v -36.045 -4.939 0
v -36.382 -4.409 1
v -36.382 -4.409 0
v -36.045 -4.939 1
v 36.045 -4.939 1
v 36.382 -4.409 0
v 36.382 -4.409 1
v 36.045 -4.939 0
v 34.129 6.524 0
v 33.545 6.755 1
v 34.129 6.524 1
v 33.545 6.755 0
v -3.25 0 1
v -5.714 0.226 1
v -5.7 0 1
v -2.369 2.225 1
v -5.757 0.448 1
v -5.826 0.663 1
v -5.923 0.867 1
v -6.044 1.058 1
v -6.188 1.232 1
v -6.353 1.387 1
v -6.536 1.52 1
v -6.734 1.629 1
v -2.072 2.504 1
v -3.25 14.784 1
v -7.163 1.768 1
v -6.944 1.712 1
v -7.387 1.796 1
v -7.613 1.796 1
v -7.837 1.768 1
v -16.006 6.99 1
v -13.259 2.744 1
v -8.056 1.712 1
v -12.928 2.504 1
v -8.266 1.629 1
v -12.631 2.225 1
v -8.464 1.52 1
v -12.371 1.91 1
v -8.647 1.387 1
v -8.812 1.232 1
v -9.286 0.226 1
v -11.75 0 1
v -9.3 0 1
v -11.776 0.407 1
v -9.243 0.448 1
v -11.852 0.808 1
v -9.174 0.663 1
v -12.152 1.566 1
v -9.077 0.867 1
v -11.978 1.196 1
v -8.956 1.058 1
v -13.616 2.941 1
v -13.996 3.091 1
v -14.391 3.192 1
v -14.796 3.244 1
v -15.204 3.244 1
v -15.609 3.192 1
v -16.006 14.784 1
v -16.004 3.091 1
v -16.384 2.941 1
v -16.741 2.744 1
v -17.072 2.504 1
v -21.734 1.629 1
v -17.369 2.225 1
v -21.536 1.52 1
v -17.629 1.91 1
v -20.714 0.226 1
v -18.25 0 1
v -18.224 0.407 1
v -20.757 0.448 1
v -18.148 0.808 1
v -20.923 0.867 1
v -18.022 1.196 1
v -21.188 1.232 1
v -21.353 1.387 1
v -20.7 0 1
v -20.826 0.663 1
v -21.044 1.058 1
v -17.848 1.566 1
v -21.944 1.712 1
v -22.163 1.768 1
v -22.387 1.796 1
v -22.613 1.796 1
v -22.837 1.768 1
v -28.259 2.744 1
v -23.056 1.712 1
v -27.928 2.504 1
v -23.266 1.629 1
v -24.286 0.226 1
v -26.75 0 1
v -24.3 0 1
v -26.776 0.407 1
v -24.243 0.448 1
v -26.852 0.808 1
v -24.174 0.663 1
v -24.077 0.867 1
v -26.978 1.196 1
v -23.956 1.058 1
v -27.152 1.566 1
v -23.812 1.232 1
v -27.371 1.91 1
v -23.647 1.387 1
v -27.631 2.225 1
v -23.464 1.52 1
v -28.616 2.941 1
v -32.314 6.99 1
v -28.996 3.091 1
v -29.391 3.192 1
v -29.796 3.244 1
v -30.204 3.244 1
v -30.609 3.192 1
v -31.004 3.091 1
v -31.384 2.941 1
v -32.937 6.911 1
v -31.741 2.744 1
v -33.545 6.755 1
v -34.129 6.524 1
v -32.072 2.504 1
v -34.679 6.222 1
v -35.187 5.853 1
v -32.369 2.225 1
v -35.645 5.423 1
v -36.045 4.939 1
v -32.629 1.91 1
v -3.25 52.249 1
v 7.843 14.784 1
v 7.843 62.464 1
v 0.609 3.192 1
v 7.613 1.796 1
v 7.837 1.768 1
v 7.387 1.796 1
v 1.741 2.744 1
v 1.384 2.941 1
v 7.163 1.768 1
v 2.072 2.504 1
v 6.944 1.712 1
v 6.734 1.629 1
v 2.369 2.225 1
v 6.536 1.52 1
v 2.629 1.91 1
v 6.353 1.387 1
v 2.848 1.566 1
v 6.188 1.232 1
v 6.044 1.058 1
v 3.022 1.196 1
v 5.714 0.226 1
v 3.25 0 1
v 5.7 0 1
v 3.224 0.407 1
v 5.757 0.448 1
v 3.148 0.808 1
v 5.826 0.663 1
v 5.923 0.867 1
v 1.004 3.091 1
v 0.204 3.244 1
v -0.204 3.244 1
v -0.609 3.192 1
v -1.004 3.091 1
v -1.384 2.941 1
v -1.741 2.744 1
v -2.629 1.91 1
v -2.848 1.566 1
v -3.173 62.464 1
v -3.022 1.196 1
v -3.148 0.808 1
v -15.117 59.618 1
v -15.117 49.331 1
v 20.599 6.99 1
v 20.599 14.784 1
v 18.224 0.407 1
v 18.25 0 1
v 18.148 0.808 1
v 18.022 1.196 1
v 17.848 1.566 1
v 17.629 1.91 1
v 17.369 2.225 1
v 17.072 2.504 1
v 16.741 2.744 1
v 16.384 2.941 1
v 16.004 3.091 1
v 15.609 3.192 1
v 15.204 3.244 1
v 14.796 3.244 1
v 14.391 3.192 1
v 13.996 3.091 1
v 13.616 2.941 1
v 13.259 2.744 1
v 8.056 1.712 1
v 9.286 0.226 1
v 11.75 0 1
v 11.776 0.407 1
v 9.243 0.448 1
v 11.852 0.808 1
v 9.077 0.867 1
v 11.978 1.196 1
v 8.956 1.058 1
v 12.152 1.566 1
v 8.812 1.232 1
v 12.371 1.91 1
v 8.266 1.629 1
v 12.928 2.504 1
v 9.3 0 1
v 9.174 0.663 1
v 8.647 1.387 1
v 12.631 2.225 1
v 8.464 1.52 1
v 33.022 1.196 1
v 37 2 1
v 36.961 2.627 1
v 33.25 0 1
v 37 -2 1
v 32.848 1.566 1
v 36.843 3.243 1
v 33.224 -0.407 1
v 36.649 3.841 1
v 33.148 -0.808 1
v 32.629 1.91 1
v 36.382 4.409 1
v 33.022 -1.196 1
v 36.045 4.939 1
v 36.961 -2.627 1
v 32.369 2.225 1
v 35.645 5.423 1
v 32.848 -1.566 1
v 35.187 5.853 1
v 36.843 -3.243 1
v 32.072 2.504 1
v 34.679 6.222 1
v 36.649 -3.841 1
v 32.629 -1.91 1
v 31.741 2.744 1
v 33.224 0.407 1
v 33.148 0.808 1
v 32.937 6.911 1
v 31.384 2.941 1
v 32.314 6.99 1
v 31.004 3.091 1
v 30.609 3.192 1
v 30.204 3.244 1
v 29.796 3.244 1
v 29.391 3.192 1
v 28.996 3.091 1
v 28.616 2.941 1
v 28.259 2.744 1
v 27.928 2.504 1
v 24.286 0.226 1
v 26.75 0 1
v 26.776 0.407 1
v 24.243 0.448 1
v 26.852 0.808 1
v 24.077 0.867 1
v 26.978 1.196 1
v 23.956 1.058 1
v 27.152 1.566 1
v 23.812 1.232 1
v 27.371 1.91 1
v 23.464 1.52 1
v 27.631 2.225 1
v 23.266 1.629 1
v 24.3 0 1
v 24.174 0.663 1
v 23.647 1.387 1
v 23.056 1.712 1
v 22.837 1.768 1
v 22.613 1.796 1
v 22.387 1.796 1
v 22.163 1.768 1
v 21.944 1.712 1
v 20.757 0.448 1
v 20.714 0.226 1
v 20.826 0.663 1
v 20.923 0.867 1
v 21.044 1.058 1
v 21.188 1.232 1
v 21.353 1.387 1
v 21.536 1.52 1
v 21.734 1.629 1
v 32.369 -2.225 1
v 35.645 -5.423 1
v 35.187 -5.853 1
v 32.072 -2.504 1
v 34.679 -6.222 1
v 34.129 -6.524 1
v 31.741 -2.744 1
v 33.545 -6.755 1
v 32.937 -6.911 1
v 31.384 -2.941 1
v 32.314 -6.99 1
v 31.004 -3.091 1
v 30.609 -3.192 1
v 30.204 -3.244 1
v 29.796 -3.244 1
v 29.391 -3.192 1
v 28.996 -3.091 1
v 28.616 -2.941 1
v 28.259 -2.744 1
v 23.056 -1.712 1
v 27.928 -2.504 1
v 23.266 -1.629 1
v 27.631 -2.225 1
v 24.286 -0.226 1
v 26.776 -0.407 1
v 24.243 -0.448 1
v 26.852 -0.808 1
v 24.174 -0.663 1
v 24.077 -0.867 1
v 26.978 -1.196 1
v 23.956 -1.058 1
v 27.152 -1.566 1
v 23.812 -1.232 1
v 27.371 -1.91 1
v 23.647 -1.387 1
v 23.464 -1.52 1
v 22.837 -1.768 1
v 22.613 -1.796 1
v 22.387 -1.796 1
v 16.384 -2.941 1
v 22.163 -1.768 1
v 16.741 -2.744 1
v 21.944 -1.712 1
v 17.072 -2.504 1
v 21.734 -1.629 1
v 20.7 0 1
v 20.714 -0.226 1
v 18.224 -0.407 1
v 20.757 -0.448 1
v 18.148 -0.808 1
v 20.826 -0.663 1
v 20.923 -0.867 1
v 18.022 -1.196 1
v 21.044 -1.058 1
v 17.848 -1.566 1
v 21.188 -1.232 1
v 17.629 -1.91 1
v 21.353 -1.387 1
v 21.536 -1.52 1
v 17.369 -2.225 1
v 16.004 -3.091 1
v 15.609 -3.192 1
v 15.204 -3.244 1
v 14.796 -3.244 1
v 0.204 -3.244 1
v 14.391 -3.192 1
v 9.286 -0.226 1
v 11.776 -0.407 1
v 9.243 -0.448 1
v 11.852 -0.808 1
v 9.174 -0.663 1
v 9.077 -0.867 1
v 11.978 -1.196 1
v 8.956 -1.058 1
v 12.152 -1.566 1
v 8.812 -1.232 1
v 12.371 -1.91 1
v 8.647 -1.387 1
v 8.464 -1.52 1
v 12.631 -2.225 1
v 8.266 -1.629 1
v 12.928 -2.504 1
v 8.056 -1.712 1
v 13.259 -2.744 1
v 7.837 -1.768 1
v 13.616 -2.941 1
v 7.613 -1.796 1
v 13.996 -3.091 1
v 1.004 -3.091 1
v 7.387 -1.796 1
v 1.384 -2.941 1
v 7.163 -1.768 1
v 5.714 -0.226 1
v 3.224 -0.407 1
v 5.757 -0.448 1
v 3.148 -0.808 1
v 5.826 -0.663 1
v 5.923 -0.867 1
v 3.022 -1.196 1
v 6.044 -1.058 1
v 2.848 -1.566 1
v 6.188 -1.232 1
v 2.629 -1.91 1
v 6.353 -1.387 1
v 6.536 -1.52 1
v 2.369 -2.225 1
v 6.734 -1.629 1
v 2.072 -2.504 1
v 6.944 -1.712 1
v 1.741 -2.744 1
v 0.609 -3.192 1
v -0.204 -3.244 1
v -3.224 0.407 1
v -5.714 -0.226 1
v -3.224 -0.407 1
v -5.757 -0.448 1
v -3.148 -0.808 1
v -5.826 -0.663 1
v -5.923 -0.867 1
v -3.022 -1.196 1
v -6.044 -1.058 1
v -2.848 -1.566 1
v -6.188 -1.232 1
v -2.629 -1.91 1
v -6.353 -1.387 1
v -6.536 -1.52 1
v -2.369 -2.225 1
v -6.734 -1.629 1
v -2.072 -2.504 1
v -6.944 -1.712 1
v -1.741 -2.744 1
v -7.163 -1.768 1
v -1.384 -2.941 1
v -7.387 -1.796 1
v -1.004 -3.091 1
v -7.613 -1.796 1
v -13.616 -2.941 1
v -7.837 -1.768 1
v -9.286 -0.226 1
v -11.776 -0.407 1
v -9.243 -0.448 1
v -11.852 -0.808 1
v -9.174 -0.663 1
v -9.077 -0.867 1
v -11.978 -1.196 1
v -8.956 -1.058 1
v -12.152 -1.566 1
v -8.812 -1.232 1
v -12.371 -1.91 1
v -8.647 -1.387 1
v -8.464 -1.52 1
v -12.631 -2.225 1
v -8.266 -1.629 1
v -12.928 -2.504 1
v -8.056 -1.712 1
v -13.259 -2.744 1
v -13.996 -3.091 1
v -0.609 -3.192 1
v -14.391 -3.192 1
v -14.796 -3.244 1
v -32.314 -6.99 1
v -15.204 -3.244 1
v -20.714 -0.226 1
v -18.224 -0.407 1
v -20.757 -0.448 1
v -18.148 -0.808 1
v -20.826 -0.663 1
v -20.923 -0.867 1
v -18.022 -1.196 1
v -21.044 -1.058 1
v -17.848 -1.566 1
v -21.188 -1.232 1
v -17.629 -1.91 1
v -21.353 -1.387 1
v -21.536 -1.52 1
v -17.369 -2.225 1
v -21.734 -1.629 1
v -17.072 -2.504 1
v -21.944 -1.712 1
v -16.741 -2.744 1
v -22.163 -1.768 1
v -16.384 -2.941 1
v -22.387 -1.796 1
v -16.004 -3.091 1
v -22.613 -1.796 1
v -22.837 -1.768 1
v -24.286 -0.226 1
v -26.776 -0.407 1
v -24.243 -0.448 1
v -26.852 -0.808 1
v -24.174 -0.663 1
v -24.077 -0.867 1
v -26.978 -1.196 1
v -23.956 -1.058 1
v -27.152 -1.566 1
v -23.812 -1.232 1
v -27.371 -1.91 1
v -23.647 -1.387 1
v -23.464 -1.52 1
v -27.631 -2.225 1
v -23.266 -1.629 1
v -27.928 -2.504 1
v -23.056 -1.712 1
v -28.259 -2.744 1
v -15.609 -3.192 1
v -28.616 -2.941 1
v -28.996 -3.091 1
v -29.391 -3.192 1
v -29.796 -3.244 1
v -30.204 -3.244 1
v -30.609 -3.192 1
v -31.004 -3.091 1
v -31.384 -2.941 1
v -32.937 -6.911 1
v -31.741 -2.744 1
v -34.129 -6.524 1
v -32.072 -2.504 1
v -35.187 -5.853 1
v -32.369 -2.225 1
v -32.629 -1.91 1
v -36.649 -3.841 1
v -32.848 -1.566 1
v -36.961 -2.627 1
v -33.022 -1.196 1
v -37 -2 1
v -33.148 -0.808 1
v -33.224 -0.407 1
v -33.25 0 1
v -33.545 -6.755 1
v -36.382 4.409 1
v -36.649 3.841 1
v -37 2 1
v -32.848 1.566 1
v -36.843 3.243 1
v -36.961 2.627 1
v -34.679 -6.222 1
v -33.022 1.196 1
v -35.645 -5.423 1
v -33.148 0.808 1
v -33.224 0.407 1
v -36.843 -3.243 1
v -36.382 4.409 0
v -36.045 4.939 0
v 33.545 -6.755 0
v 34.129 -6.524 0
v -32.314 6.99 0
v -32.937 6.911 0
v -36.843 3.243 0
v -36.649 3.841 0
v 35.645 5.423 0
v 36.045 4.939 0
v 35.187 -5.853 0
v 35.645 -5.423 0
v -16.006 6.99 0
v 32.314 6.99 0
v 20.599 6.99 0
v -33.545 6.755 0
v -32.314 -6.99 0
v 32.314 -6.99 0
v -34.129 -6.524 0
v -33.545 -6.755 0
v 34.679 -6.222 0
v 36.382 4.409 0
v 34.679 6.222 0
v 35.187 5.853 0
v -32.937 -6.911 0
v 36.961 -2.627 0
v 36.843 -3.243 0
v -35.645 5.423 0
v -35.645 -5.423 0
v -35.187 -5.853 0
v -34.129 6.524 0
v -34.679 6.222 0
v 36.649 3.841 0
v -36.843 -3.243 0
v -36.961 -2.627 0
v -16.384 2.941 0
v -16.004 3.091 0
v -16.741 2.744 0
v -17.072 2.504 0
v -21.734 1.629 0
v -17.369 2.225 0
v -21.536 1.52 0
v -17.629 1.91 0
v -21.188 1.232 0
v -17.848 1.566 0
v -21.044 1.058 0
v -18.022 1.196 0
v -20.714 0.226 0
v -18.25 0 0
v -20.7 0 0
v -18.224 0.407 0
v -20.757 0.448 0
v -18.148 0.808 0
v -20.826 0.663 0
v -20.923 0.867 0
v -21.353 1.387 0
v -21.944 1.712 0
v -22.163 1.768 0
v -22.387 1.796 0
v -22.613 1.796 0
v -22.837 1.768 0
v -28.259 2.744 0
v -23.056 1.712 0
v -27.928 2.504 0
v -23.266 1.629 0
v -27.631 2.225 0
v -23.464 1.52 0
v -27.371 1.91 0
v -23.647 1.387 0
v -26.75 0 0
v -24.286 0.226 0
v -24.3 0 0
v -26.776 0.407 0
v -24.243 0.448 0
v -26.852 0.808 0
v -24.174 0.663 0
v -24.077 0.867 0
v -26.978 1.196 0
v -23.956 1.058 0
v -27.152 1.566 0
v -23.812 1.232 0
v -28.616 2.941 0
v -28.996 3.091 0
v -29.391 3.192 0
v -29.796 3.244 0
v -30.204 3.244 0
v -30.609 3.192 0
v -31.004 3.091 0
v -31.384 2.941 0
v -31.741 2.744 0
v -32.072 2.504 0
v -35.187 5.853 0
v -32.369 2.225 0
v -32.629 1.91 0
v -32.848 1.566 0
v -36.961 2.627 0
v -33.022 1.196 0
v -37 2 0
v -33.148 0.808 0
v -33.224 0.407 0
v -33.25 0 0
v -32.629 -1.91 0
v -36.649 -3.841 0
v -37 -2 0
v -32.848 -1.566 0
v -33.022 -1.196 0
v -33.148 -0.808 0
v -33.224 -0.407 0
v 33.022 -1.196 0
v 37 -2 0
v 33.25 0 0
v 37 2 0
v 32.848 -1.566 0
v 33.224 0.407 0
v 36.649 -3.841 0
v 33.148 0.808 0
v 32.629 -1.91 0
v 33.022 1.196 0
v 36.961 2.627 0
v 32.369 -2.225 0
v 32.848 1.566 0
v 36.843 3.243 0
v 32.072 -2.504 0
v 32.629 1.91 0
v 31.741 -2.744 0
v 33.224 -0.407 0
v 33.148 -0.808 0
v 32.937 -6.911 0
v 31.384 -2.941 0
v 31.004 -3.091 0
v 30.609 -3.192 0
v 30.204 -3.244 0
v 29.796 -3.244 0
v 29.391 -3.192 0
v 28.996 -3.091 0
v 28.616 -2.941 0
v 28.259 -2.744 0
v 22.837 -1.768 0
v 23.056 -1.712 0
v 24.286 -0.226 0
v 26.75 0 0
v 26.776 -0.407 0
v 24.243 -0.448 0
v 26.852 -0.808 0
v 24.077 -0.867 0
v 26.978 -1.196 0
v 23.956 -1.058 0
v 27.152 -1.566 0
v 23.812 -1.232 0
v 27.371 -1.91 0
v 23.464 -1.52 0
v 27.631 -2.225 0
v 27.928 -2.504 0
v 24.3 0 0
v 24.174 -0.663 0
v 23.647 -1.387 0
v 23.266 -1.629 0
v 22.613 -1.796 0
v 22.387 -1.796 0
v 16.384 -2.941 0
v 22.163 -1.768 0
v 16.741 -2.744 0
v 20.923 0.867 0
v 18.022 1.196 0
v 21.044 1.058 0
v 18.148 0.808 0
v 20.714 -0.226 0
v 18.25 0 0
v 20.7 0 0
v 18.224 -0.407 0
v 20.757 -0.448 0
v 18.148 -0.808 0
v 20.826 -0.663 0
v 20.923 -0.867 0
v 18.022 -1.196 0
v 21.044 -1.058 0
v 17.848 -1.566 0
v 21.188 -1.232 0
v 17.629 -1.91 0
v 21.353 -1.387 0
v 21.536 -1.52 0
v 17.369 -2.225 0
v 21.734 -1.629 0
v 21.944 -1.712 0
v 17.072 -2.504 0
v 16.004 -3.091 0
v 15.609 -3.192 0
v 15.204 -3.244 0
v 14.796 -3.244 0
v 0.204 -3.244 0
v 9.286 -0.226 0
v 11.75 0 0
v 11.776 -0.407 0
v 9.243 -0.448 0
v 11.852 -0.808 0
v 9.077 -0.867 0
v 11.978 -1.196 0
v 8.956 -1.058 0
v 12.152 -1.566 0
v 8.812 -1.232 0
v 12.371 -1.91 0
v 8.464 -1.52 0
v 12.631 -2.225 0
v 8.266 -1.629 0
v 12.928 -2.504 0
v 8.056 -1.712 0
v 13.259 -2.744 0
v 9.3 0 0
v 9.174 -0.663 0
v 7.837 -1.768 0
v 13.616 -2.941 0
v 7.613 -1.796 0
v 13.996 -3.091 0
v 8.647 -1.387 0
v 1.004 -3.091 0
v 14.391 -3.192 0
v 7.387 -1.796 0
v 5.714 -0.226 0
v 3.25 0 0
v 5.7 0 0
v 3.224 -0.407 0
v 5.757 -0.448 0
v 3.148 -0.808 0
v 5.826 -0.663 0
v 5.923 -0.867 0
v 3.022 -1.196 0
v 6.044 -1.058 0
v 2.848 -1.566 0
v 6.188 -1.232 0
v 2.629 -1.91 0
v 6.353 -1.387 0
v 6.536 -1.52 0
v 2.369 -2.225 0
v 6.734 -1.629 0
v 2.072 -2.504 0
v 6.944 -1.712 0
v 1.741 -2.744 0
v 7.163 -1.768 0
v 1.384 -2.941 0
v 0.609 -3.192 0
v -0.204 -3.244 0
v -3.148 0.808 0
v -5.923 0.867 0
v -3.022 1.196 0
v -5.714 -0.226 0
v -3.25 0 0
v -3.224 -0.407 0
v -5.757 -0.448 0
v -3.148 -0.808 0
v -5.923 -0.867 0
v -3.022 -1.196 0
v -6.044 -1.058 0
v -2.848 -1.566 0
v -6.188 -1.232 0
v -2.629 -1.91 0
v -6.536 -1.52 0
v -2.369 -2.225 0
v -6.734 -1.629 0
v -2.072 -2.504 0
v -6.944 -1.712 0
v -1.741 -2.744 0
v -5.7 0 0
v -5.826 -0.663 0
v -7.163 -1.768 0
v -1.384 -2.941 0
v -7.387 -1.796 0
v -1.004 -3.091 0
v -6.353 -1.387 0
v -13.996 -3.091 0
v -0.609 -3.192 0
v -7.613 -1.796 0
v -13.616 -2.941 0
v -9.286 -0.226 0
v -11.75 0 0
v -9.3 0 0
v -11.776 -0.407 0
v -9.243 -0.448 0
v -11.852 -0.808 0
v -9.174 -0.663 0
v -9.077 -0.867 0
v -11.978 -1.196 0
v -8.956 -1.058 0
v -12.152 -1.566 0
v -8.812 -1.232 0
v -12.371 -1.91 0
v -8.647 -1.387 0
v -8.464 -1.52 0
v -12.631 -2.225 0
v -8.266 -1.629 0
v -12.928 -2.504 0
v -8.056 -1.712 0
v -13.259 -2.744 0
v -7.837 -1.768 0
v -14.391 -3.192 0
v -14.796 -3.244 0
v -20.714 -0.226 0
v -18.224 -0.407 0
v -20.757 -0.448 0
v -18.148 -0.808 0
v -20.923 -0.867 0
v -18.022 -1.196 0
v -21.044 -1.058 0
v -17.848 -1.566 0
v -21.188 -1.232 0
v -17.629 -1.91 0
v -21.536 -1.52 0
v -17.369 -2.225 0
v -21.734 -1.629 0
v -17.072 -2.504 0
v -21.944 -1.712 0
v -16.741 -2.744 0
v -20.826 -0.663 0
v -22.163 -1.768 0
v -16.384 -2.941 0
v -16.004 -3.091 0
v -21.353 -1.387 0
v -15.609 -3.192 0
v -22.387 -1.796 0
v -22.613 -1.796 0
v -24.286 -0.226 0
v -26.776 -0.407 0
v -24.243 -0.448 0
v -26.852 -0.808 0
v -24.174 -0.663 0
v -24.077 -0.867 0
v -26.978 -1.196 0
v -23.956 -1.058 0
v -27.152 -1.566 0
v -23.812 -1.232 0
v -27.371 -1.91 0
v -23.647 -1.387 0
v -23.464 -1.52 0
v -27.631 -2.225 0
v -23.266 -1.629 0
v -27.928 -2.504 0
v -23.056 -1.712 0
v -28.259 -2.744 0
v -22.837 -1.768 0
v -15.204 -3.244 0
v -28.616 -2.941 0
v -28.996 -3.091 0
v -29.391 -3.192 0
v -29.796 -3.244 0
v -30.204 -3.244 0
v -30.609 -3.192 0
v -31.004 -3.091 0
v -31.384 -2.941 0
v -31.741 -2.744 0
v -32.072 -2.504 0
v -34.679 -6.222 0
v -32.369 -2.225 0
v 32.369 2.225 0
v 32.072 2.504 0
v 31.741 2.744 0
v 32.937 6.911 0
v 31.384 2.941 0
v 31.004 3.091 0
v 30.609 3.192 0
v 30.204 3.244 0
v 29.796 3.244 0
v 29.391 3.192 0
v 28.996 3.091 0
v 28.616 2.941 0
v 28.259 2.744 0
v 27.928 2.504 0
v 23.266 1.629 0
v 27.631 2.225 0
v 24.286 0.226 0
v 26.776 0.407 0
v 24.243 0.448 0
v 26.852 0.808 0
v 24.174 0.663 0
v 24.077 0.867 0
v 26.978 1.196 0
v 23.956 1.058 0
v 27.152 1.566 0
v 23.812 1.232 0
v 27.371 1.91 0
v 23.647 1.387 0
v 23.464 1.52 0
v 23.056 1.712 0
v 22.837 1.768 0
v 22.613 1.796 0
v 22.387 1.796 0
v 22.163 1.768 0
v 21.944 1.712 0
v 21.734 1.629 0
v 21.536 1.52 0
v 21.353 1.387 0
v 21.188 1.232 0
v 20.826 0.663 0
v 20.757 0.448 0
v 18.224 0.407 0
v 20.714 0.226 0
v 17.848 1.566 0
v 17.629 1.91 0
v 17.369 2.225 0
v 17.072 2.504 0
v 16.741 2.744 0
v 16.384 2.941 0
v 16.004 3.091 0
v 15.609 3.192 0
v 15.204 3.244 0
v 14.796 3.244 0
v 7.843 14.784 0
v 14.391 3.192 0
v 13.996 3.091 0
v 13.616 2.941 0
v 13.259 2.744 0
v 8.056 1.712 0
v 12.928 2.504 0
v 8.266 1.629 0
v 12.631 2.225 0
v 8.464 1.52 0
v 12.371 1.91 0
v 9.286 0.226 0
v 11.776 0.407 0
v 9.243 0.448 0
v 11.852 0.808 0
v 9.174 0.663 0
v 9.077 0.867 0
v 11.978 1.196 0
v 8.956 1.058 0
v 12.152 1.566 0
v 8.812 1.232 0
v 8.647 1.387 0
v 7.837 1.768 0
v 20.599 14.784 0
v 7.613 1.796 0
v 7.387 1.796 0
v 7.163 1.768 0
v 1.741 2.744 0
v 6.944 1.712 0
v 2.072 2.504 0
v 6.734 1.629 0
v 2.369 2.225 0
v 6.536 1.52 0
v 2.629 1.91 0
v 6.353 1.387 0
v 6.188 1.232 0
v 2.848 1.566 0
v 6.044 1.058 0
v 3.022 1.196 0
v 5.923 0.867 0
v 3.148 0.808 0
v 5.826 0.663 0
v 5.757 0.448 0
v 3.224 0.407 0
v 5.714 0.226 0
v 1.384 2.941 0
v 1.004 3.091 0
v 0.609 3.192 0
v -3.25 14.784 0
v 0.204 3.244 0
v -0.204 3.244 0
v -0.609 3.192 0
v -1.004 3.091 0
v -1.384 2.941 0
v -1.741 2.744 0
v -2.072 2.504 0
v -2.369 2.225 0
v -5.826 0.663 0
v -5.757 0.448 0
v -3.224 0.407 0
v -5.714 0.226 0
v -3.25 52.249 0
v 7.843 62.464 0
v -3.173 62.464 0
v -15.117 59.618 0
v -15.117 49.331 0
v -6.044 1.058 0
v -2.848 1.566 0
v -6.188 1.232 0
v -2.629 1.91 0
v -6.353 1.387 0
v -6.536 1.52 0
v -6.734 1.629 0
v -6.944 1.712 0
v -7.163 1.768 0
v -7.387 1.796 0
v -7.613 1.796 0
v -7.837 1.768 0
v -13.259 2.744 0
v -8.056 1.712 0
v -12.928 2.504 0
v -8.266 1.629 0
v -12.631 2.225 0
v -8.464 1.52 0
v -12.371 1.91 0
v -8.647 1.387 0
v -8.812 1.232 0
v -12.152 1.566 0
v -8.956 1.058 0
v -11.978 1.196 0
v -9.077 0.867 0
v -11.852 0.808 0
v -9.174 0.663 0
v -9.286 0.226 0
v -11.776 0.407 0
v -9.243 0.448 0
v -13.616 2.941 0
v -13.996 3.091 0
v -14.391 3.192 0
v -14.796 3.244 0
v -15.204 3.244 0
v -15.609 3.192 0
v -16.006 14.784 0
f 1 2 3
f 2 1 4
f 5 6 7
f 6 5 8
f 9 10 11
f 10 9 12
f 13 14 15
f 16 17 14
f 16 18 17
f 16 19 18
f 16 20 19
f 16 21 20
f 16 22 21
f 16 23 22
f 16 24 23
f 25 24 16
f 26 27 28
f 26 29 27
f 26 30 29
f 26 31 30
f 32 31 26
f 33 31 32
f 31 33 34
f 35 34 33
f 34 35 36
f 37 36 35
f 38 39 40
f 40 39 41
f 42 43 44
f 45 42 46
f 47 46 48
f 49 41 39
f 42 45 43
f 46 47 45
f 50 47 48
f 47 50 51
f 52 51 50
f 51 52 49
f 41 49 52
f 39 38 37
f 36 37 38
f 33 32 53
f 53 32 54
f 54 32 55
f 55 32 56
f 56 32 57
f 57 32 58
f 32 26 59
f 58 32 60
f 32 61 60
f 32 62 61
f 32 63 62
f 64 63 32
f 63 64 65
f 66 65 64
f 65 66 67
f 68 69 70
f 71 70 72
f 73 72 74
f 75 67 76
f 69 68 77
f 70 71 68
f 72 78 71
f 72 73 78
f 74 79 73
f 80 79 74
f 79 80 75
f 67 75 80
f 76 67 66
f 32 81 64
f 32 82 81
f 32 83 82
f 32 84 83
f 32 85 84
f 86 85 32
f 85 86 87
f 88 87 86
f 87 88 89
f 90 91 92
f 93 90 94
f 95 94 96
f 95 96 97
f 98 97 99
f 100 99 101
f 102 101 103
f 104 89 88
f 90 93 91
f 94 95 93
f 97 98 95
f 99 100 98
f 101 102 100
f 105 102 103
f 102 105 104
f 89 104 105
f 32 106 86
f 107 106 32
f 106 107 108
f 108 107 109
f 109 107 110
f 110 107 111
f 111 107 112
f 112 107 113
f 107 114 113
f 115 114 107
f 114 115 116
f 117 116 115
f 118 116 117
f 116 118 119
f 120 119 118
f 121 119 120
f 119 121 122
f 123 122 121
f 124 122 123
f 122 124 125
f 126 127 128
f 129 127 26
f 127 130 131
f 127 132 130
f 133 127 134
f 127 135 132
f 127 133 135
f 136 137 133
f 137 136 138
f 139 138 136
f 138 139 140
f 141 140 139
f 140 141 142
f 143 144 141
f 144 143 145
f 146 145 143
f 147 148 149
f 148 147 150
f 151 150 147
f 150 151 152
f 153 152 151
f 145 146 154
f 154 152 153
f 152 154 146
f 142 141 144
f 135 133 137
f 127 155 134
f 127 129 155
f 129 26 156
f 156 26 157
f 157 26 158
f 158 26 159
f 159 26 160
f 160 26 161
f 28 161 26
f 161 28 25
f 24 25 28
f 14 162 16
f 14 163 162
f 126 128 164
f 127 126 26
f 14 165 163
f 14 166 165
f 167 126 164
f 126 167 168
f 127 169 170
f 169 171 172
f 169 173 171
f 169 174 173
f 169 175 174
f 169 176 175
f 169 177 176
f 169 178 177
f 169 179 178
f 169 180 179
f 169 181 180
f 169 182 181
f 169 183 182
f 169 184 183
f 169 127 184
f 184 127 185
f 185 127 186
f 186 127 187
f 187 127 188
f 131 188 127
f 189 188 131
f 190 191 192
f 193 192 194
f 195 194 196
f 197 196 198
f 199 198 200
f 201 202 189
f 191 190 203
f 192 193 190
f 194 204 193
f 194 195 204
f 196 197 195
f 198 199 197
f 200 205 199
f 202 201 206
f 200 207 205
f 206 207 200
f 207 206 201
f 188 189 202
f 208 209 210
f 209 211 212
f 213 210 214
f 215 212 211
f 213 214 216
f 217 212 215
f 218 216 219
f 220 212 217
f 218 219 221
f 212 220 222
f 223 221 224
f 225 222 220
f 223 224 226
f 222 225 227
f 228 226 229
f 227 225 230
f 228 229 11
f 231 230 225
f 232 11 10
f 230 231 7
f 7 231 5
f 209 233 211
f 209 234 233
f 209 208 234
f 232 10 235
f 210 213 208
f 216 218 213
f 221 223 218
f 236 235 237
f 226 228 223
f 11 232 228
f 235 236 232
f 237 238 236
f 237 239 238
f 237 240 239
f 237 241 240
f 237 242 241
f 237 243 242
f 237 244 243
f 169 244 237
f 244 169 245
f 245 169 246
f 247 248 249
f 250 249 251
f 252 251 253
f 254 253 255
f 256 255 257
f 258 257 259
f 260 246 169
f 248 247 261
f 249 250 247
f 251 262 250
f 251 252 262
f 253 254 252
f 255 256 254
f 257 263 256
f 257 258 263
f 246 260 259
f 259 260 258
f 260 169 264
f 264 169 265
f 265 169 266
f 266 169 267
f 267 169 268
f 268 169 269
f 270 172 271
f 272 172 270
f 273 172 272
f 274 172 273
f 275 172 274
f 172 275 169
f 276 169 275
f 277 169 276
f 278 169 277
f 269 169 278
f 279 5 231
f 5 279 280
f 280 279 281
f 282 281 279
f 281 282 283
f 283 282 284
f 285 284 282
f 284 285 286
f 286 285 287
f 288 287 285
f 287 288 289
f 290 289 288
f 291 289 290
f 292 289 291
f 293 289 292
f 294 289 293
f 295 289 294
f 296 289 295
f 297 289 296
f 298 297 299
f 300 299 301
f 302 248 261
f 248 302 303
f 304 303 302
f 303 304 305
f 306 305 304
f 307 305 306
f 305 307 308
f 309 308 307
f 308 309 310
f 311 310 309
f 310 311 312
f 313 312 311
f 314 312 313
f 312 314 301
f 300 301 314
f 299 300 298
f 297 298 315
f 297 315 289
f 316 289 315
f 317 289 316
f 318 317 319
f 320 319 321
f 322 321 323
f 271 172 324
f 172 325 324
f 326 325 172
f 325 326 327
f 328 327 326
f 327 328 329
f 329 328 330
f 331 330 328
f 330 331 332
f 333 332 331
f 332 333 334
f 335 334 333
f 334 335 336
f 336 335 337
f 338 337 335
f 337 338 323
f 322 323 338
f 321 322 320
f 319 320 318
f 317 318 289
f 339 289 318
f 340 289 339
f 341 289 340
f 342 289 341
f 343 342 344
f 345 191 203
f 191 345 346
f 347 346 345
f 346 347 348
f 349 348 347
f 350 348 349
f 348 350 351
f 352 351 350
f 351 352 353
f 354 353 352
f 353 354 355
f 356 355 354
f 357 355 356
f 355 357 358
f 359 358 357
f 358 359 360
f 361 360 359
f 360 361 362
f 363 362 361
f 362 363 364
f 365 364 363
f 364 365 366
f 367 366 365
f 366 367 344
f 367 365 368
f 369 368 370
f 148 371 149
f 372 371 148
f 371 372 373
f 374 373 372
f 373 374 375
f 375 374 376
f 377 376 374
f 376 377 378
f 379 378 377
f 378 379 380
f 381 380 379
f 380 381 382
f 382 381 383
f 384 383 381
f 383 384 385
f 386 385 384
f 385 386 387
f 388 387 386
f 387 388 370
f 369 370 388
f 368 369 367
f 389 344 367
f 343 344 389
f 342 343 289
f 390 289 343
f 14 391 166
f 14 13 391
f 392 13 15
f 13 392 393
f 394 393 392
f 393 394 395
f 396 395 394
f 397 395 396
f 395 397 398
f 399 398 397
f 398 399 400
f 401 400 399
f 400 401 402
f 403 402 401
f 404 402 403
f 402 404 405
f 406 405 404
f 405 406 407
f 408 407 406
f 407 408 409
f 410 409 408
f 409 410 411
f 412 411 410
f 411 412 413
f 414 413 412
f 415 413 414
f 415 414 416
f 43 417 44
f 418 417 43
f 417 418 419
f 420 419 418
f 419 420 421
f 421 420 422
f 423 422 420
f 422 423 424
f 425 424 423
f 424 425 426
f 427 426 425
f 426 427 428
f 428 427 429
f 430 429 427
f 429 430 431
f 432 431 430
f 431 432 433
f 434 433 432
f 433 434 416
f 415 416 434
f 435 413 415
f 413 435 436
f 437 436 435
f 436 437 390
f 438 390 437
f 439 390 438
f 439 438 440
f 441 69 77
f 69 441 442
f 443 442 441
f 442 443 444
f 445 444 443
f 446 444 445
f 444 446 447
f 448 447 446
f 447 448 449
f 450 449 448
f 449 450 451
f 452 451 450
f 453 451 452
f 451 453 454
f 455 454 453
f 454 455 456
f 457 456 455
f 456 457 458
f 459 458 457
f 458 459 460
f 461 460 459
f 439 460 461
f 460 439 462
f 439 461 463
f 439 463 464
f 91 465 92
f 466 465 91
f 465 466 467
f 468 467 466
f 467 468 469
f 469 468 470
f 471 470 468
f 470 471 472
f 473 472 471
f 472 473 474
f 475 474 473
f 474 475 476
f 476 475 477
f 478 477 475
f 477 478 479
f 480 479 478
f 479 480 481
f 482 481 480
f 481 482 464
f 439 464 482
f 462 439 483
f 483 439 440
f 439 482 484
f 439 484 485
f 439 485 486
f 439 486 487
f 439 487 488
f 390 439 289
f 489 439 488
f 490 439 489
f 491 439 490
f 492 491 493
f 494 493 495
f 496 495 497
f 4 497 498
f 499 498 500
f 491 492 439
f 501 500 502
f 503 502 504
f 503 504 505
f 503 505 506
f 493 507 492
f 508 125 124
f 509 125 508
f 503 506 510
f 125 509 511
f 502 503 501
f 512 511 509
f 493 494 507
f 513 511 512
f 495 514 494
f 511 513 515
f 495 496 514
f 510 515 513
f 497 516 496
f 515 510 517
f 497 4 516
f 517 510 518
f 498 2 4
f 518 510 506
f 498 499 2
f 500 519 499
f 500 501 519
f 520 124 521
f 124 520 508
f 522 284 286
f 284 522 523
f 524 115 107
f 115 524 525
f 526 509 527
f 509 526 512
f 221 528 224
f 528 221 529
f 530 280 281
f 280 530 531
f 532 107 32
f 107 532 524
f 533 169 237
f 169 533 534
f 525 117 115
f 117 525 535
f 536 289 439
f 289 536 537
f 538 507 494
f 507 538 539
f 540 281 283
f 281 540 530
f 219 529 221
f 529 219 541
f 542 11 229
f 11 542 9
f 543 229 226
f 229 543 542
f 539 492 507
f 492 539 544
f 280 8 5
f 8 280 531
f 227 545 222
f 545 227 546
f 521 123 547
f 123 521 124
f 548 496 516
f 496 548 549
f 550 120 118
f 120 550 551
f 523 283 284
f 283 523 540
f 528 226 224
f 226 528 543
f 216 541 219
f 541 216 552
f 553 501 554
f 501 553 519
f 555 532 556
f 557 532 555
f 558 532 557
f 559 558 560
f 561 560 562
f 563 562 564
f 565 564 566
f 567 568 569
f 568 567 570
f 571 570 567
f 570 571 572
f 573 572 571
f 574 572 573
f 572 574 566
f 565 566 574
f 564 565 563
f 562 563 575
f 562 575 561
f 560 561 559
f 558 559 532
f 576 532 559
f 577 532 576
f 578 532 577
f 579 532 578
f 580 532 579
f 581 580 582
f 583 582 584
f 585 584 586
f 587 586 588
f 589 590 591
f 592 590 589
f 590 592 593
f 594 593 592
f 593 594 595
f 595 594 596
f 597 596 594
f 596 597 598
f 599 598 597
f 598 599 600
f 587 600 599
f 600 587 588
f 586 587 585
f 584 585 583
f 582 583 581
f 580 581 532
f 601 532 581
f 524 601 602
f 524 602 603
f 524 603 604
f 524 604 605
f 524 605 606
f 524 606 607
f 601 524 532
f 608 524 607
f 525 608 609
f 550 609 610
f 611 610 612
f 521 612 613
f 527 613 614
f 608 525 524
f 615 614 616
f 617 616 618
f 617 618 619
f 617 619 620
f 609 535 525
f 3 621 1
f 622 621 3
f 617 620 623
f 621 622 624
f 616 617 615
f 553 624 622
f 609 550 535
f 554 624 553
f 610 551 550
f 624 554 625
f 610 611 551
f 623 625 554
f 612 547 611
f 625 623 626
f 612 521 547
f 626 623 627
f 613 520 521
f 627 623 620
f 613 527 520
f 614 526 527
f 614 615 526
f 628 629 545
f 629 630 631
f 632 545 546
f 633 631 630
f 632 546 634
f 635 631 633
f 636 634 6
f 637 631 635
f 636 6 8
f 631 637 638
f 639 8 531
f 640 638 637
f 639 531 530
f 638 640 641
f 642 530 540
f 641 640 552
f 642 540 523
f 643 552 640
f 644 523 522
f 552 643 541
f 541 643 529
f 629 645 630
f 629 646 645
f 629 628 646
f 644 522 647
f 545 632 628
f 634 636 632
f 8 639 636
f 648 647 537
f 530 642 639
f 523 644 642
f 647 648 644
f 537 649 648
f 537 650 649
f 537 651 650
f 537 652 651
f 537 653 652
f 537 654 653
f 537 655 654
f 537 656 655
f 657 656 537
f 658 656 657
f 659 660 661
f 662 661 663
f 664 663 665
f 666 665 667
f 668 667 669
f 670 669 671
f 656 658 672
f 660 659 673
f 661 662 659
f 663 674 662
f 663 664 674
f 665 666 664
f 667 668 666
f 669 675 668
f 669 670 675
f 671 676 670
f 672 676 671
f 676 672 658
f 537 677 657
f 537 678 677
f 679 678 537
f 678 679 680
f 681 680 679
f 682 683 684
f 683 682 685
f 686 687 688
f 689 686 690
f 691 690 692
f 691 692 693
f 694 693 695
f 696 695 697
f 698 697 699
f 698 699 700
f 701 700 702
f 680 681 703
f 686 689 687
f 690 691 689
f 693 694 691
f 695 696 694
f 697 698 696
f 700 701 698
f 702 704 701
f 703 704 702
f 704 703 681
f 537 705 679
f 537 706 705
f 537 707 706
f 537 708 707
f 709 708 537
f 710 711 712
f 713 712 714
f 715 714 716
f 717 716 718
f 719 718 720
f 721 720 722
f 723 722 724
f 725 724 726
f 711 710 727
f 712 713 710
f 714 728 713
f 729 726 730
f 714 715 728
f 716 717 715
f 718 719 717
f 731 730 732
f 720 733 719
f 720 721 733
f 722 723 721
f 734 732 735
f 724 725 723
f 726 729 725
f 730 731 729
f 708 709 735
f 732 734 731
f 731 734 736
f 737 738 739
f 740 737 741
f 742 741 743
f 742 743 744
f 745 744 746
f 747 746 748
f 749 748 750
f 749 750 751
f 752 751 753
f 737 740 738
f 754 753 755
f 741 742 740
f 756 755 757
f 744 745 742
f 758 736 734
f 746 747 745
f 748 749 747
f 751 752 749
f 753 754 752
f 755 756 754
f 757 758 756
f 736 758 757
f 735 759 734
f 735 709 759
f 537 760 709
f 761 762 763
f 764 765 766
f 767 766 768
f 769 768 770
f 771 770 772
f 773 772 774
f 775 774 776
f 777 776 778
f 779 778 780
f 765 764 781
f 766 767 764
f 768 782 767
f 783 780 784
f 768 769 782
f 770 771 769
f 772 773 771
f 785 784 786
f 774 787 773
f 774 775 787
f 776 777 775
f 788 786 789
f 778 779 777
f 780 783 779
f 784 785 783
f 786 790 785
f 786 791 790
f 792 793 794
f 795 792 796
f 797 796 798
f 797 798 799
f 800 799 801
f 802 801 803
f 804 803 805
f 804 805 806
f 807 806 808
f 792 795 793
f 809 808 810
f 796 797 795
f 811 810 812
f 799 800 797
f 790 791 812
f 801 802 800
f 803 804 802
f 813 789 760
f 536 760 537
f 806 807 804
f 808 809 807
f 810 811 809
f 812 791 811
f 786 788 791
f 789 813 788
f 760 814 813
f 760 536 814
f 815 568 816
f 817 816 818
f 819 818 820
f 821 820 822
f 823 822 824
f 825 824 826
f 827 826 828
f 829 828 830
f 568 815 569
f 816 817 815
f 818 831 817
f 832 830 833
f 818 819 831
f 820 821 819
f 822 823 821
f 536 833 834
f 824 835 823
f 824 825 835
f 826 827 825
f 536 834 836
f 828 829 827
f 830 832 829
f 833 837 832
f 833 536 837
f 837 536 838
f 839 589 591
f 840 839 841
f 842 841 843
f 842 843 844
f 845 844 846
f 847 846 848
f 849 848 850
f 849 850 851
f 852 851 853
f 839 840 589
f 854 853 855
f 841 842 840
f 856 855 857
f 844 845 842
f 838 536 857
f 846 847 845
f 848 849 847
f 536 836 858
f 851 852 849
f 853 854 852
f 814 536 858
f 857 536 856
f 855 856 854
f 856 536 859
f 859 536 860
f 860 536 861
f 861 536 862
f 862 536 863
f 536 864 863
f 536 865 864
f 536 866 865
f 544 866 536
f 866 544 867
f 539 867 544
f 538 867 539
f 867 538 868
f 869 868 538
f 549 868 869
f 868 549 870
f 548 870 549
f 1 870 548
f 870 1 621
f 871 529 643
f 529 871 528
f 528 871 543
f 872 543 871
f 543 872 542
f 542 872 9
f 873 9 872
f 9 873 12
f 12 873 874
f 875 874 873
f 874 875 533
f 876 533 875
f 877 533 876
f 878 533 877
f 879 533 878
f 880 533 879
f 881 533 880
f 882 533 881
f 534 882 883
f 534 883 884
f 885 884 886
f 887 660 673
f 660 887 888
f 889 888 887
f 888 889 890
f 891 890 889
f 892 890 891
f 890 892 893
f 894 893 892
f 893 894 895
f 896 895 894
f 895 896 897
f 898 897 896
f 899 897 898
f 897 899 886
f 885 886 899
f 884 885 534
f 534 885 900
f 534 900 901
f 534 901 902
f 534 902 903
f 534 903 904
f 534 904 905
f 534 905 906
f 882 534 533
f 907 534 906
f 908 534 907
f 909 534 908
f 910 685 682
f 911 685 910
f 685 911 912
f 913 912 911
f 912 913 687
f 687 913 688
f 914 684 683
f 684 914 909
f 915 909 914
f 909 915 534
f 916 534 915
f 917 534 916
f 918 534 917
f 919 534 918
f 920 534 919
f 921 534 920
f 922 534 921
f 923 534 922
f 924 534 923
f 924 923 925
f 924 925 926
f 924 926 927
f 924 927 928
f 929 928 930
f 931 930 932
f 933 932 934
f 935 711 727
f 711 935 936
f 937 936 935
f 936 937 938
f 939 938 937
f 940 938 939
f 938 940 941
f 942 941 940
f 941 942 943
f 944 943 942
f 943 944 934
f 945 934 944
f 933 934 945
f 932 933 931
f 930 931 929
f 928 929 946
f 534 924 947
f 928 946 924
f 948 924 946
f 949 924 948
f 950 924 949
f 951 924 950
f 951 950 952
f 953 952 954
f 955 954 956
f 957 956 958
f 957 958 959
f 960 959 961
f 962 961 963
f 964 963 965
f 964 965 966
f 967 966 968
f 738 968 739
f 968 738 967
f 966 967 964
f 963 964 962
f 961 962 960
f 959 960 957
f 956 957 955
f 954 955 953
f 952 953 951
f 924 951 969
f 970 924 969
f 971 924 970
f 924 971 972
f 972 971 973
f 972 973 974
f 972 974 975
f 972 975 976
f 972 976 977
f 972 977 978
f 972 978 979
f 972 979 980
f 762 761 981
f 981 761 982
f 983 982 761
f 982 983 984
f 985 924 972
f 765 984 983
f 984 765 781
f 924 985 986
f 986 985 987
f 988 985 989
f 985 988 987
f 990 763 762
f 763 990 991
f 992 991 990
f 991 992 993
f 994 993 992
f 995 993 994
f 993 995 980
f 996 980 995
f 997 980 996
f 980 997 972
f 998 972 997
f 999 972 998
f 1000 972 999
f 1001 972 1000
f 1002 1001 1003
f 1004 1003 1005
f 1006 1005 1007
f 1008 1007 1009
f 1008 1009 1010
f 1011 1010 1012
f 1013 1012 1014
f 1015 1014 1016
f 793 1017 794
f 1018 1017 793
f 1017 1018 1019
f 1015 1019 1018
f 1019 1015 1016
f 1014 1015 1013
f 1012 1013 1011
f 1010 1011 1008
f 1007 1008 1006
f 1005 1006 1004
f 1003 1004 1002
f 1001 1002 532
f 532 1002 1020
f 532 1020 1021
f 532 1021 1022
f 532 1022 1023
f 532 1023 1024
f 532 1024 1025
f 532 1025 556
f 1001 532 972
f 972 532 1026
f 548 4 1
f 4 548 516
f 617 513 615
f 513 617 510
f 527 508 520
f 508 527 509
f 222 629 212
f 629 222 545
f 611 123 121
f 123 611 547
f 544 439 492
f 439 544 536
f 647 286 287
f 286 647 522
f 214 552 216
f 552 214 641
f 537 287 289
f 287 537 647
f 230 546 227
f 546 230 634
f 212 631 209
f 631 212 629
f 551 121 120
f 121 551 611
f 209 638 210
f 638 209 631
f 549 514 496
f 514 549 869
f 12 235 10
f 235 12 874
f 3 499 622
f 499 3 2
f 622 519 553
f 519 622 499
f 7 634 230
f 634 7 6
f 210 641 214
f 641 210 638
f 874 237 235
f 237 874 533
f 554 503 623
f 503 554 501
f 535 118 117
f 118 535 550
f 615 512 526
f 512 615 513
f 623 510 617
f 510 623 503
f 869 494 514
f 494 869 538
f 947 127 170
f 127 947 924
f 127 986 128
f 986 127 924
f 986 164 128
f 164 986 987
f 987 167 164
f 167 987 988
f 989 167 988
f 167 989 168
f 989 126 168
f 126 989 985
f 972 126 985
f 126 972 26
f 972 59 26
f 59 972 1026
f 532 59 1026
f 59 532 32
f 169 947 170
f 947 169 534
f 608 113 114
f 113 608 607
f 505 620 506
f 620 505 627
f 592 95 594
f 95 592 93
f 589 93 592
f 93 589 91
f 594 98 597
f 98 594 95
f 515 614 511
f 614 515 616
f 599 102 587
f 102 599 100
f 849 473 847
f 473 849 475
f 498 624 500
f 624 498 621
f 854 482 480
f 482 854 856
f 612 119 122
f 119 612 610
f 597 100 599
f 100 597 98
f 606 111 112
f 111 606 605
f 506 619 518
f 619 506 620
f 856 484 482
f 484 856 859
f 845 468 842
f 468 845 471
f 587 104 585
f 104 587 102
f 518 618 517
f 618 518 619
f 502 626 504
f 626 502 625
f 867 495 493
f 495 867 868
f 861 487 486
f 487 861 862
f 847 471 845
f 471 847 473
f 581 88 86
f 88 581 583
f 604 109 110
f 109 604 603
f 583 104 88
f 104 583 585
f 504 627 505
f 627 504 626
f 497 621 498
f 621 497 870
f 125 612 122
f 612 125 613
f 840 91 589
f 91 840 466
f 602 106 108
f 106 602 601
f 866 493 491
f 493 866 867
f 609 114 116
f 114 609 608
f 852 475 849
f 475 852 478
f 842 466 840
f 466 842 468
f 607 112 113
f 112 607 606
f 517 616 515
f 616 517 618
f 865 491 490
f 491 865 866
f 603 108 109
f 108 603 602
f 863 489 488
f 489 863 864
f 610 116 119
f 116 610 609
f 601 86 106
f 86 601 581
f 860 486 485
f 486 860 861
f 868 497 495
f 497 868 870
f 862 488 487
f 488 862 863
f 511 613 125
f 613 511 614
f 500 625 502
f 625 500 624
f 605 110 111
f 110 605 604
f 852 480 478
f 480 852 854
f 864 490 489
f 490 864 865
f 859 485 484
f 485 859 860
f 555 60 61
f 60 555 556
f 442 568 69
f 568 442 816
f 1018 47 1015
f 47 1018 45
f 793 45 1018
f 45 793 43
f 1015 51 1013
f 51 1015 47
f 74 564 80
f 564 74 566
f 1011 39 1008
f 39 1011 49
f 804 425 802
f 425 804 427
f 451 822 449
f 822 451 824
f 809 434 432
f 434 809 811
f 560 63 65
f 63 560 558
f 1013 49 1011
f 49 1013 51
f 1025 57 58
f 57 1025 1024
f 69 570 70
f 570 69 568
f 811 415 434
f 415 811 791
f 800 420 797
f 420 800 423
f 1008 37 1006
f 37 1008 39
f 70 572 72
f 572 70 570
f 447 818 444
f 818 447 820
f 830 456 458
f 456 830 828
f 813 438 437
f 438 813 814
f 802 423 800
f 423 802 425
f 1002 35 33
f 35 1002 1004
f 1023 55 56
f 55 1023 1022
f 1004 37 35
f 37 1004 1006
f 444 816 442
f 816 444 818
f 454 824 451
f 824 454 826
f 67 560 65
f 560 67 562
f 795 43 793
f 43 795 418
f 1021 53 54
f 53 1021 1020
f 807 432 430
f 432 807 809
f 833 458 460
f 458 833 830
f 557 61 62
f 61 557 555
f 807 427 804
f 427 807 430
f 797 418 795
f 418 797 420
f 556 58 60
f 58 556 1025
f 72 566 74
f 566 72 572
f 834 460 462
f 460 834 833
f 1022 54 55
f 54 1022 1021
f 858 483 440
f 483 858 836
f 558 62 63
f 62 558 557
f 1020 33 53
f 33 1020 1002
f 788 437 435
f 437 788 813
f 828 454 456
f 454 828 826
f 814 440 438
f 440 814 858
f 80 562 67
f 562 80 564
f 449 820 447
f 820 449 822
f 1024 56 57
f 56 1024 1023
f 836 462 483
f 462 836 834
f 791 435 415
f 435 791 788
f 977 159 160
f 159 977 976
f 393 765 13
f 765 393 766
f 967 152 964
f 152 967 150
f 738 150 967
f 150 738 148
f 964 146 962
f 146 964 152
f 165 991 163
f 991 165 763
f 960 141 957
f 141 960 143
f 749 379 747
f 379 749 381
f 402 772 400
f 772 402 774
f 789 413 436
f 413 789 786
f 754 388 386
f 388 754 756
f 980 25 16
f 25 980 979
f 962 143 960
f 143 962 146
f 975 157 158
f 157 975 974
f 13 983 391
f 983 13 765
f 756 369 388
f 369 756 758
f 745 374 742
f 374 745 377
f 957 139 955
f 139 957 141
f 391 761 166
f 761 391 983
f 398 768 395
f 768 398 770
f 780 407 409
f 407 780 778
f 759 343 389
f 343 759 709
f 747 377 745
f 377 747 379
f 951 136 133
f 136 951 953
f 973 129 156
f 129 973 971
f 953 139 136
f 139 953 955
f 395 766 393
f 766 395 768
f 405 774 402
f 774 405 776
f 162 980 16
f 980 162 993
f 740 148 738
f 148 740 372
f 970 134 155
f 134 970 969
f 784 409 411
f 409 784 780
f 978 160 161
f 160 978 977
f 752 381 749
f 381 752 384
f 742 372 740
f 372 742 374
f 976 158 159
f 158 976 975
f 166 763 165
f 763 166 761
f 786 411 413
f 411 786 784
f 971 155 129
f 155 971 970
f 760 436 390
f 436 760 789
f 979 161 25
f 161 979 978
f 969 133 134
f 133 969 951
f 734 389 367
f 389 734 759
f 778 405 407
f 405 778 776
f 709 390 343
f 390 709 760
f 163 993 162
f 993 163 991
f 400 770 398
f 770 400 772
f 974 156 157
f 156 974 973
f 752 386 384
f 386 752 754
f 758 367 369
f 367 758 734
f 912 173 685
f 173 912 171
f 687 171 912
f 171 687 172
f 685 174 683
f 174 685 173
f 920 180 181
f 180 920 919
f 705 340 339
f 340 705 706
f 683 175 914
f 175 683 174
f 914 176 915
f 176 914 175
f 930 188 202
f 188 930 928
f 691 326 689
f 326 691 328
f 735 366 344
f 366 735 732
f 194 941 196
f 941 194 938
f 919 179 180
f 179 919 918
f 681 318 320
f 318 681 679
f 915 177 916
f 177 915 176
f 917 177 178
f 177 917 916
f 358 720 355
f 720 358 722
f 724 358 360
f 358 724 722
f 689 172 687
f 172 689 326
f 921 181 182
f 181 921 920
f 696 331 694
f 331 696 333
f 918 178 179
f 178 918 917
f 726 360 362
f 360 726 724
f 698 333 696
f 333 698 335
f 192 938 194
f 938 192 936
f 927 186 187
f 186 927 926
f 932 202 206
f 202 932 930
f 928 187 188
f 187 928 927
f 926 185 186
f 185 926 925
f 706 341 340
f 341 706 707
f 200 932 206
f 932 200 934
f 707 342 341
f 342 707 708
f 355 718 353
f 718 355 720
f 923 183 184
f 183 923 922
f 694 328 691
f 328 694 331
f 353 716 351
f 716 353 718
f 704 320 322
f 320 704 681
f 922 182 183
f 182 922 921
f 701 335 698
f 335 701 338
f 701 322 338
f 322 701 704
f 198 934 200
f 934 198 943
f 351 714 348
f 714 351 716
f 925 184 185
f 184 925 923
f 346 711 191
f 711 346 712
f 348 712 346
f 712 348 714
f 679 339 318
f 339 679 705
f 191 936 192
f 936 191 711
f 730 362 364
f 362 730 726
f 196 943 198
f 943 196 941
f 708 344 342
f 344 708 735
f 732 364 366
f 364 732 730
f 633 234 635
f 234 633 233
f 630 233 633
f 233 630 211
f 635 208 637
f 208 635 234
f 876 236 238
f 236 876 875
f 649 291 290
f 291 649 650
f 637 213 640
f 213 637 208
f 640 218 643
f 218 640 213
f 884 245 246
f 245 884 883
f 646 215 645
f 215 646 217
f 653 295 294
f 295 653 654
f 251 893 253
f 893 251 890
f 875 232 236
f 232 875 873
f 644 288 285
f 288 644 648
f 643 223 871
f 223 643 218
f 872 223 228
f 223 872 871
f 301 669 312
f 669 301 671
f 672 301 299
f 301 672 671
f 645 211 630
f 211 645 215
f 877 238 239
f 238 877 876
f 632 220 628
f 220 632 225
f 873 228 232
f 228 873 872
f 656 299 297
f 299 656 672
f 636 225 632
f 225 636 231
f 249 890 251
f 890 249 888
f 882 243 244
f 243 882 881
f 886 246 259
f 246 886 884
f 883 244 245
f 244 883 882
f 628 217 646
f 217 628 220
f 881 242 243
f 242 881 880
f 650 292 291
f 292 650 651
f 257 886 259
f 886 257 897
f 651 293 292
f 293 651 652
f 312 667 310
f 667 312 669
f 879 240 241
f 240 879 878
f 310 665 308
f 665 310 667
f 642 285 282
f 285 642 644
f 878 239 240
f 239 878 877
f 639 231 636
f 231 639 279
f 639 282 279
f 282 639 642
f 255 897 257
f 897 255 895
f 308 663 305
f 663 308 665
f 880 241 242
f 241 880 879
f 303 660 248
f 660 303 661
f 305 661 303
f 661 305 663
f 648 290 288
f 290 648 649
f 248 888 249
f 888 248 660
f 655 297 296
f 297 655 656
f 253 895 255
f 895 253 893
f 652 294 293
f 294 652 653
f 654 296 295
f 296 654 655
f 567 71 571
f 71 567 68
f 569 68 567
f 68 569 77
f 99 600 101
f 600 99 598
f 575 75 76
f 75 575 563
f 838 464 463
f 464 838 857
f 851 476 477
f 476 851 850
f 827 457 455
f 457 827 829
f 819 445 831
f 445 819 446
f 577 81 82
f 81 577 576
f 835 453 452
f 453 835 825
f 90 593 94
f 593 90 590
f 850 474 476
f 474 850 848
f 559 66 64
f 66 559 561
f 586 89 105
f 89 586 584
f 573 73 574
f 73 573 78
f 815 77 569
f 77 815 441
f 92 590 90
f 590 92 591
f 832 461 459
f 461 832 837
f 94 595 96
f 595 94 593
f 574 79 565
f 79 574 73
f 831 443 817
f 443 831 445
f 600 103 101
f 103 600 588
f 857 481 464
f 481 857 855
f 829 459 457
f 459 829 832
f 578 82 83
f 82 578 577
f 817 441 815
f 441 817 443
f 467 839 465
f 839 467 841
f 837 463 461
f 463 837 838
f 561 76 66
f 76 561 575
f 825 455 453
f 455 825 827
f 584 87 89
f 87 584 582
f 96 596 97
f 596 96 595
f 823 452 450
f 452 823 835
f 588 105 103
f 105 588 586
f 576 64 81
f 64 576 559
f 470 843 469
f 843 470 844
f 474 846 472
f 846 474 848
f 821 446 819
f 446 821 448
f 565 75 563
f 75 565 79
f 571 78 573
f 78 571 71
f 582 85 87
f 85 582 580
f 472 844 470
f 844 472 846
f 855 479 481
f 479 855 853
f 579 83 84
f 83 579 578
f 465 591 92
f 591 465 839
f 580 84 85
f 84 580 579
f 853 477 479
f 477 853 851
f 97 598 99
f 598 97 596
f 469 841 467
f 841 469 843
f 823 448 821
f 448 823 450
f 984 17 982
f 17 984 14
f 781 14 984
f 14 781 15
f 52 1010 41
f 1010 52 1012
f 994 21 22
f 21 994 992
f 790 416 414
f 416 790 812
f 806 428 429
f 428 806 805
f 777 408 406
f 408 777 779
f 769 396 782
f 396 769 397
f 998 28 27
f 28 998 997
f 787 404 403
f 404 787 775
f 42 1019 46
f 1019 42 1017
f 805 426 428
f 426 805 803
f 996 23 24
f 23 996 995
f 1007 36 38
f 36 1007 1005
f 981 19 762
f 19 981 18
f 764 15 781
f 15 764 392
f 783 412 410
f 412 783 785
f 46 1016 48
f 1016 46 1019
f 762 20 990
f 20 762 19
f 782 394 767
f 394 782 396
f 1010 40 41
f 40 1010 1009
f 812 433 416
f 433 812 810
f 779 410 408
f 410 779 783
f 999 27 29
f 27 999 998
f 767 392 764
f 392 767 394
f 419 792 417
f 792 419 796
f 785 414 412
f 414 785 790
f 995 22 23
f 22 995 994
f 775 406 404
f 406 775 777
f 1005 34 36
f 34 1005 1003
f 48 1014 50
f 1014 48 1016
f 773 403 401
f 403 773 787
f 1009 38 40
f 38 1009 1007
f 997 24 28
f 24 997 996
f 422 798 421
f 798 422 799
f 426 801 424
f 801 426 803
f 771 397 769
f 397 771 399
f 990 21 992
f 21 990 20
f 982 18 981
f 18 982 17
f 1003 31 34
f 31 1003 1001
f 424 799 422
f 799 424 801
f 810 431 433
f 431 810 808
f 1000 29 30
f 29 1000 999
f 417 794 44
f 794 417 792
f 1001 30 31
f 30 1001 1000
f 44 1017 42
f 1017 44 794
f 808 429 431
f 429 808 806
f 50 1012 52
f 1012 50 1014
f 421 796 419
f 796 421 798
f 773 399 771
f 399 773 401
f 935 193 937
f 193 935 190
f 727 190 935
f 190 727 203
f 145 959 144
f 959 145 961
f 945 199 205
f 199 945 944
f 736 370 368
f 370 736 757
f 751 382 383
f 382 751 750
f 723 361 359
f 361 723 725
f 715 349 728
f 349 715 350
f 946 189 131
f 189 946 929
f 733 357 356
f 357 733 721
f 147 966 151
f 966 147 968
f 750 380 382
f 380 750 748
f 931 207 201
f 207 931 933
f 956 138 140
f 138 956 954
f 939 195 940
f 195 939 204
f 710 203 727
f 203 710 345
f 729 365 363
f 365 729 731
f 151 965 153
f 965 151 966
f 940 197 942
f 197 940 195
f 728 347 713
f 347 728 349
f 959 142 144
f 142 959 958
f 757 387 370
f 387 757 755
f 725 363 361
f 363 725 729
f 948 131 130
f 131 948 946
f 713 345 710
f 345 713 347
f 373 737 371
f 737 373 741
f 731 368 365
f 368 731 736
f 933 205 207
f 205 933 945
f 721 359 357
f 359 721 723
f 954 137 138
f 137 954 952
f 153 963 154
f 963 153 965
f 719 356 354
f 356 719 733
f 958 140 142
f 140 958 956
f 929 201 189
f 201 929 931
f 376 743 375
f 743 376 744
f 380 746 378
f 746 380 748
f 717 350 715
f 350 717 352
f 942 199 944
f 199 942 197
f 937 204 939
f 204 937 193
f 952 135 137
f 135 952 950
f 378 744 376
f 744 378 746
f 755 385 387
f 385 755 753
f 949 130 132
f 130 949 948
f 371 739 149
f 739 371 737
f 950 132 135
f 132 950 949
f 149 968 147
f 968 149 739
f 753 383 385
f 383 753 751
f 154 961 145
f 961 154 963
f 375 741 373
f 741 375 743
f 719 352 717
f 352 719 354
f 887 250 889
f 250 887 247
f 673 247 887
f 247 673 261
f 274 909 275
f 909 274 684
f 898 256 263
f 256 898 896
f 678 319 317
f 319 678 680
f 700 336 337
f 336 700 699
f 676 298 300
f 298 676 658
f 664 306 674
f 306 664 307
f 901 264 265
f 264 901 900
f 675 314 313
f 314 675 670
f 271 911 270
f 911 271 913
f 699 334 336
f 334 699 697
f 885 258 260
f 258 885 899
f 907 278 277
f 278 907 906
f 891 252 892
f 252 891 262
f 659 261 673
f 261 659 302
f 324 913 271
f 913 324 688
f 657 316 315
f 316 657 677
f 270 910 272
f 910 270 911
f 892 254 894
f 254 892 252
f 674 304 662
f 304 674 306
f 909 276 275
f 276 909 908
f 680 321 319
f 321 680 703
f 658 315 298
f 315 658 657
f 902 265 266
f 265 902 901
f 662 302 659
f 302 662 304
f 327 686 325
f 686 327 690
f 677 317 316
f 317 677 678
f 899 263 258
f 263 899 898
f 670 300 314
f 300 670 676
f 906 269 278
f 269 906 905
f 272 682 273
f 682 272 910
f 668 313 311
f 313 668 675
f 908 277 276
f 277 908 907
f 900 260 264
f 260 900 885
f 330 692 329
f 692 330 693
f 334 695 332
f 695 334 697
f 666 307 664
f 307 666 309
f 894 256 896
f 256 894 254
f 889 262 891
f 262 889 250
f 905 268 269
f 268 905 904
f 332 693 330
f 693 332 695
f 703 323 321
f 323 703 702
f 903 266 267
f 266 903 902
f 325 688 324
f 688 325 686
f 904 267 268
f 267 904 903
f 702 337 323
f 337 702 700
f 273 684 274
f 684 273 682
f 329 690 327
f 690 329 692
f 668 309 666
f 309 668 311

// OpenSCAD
$fn = 50;


difference() {
	union() {
		hull() {
			translate(v = [-32.0000000000, 2.0000000000, 0]) {
				cylinder(h = 1, r = 5);
			}
			translate(v = [32.0000000000, 2.0000000000, 0]) {
				cylinder(h = 1, r = 5);
			}
			translate(v = [-32.0000000000, -2.0000000000, 0]) {
				cylinder(h = 1, r = 5);
			}
			translate(v = [32.0000000000, -2.0000000000, 0]) {
				cylinder(h = 1, r = 5);
			}
		}
		translate(v = [0, 61.1111111111, 0]) {
			linear_extrude(height = 1) {
				text(font = "DejaVu Sans Mono:style=Bold", halign = "center", size = 57.0000000000, text = "1", valign = "top");
			}
		}
	}
	union() {
		translate(v = [-30.0000000000, 0.0000000000, 0]) {
			translate(v = [0, 0, -100]) {
				cylinder(h = 200, r = 3.2500000000);
			}
		}
		translate(v = [-15.0000000000, 0.0000000000, 0]) {
			translate(v = [0, 0, -100]) {
				cylinder(h = 200, r = 3.2500000000);
			}
		}
		translate(v = [0, 0, -100]) {
			cylinder(h = 200, r = 3.2500000000);
		}
		translate(v = [15.0000000000, 0.0000000000, 0]) {
			translate(v = [0, 0, -100]) {
				cylinder(h = 200, r = 3.2500000000);
			}
		}
		translate(v = [30.0000000000, 0.0000000000, 0]) {
			translate(v = [0, 0, -100]) {
				cylinder(h = 200, r = 3.2500000000);
			}
		}
		translate(v = [-30.0000000000, 0.0000000000, 0]) {
			translate(v = [0, 0, -100]) {
				cylinder(h = 200, r = 1.8000000000);
			}
		}
		translate(v = [-22.5000000000, 0.0000000000, 0]) {
			translate(v = [0, 0, -100]) {
				cylinder(h = 200, r = 1.8000000000);
			}
		}
		translate(v = [-15.0000000000, 0.0000000000, 0]) {
			translate(v = [0, 0, -100]) {
				cylinder(h = 200, r = 1.8000000000);
			}
		}
		translate(v = [-7.5000000000, 0.0000000000, 0]) {
			translate(v = [0, 0, -100]) {
				cylinder(h = 200, r = 1.8000000000);
			}
		}
		translate(v = [0, 0, -100]) {
			cylinder(h = 200, r = 1.8000000000);
		}
		translate(v = [7.5000000000, 0.0000000000, 0]) {
			translate(v = [0, 0, -100]) {
				cylinder(h = 200, r = 1.8000000000);
			}
		}
		translate(v = [15.0000000000, 0.0000000000, 0]) {
			translate(v = [0, 0, -100]) {
				cylinder(h = 200, r = 1.8000000000);
			}
		}
		translate(v = [22.5000000000, 0.0000000000, 0]) {
			translate(v = [0, 0, -100]) {
				cylinder(h = 200, r = 1.8000000000);
			}
		}
		translate(v = [30.0000000000, 0.0000000000, 0]) {
			translate(v = [0, 0, -100]) {
				cylinder(h = 200, r = 1.8000000000);
			}
		}
	}
}
